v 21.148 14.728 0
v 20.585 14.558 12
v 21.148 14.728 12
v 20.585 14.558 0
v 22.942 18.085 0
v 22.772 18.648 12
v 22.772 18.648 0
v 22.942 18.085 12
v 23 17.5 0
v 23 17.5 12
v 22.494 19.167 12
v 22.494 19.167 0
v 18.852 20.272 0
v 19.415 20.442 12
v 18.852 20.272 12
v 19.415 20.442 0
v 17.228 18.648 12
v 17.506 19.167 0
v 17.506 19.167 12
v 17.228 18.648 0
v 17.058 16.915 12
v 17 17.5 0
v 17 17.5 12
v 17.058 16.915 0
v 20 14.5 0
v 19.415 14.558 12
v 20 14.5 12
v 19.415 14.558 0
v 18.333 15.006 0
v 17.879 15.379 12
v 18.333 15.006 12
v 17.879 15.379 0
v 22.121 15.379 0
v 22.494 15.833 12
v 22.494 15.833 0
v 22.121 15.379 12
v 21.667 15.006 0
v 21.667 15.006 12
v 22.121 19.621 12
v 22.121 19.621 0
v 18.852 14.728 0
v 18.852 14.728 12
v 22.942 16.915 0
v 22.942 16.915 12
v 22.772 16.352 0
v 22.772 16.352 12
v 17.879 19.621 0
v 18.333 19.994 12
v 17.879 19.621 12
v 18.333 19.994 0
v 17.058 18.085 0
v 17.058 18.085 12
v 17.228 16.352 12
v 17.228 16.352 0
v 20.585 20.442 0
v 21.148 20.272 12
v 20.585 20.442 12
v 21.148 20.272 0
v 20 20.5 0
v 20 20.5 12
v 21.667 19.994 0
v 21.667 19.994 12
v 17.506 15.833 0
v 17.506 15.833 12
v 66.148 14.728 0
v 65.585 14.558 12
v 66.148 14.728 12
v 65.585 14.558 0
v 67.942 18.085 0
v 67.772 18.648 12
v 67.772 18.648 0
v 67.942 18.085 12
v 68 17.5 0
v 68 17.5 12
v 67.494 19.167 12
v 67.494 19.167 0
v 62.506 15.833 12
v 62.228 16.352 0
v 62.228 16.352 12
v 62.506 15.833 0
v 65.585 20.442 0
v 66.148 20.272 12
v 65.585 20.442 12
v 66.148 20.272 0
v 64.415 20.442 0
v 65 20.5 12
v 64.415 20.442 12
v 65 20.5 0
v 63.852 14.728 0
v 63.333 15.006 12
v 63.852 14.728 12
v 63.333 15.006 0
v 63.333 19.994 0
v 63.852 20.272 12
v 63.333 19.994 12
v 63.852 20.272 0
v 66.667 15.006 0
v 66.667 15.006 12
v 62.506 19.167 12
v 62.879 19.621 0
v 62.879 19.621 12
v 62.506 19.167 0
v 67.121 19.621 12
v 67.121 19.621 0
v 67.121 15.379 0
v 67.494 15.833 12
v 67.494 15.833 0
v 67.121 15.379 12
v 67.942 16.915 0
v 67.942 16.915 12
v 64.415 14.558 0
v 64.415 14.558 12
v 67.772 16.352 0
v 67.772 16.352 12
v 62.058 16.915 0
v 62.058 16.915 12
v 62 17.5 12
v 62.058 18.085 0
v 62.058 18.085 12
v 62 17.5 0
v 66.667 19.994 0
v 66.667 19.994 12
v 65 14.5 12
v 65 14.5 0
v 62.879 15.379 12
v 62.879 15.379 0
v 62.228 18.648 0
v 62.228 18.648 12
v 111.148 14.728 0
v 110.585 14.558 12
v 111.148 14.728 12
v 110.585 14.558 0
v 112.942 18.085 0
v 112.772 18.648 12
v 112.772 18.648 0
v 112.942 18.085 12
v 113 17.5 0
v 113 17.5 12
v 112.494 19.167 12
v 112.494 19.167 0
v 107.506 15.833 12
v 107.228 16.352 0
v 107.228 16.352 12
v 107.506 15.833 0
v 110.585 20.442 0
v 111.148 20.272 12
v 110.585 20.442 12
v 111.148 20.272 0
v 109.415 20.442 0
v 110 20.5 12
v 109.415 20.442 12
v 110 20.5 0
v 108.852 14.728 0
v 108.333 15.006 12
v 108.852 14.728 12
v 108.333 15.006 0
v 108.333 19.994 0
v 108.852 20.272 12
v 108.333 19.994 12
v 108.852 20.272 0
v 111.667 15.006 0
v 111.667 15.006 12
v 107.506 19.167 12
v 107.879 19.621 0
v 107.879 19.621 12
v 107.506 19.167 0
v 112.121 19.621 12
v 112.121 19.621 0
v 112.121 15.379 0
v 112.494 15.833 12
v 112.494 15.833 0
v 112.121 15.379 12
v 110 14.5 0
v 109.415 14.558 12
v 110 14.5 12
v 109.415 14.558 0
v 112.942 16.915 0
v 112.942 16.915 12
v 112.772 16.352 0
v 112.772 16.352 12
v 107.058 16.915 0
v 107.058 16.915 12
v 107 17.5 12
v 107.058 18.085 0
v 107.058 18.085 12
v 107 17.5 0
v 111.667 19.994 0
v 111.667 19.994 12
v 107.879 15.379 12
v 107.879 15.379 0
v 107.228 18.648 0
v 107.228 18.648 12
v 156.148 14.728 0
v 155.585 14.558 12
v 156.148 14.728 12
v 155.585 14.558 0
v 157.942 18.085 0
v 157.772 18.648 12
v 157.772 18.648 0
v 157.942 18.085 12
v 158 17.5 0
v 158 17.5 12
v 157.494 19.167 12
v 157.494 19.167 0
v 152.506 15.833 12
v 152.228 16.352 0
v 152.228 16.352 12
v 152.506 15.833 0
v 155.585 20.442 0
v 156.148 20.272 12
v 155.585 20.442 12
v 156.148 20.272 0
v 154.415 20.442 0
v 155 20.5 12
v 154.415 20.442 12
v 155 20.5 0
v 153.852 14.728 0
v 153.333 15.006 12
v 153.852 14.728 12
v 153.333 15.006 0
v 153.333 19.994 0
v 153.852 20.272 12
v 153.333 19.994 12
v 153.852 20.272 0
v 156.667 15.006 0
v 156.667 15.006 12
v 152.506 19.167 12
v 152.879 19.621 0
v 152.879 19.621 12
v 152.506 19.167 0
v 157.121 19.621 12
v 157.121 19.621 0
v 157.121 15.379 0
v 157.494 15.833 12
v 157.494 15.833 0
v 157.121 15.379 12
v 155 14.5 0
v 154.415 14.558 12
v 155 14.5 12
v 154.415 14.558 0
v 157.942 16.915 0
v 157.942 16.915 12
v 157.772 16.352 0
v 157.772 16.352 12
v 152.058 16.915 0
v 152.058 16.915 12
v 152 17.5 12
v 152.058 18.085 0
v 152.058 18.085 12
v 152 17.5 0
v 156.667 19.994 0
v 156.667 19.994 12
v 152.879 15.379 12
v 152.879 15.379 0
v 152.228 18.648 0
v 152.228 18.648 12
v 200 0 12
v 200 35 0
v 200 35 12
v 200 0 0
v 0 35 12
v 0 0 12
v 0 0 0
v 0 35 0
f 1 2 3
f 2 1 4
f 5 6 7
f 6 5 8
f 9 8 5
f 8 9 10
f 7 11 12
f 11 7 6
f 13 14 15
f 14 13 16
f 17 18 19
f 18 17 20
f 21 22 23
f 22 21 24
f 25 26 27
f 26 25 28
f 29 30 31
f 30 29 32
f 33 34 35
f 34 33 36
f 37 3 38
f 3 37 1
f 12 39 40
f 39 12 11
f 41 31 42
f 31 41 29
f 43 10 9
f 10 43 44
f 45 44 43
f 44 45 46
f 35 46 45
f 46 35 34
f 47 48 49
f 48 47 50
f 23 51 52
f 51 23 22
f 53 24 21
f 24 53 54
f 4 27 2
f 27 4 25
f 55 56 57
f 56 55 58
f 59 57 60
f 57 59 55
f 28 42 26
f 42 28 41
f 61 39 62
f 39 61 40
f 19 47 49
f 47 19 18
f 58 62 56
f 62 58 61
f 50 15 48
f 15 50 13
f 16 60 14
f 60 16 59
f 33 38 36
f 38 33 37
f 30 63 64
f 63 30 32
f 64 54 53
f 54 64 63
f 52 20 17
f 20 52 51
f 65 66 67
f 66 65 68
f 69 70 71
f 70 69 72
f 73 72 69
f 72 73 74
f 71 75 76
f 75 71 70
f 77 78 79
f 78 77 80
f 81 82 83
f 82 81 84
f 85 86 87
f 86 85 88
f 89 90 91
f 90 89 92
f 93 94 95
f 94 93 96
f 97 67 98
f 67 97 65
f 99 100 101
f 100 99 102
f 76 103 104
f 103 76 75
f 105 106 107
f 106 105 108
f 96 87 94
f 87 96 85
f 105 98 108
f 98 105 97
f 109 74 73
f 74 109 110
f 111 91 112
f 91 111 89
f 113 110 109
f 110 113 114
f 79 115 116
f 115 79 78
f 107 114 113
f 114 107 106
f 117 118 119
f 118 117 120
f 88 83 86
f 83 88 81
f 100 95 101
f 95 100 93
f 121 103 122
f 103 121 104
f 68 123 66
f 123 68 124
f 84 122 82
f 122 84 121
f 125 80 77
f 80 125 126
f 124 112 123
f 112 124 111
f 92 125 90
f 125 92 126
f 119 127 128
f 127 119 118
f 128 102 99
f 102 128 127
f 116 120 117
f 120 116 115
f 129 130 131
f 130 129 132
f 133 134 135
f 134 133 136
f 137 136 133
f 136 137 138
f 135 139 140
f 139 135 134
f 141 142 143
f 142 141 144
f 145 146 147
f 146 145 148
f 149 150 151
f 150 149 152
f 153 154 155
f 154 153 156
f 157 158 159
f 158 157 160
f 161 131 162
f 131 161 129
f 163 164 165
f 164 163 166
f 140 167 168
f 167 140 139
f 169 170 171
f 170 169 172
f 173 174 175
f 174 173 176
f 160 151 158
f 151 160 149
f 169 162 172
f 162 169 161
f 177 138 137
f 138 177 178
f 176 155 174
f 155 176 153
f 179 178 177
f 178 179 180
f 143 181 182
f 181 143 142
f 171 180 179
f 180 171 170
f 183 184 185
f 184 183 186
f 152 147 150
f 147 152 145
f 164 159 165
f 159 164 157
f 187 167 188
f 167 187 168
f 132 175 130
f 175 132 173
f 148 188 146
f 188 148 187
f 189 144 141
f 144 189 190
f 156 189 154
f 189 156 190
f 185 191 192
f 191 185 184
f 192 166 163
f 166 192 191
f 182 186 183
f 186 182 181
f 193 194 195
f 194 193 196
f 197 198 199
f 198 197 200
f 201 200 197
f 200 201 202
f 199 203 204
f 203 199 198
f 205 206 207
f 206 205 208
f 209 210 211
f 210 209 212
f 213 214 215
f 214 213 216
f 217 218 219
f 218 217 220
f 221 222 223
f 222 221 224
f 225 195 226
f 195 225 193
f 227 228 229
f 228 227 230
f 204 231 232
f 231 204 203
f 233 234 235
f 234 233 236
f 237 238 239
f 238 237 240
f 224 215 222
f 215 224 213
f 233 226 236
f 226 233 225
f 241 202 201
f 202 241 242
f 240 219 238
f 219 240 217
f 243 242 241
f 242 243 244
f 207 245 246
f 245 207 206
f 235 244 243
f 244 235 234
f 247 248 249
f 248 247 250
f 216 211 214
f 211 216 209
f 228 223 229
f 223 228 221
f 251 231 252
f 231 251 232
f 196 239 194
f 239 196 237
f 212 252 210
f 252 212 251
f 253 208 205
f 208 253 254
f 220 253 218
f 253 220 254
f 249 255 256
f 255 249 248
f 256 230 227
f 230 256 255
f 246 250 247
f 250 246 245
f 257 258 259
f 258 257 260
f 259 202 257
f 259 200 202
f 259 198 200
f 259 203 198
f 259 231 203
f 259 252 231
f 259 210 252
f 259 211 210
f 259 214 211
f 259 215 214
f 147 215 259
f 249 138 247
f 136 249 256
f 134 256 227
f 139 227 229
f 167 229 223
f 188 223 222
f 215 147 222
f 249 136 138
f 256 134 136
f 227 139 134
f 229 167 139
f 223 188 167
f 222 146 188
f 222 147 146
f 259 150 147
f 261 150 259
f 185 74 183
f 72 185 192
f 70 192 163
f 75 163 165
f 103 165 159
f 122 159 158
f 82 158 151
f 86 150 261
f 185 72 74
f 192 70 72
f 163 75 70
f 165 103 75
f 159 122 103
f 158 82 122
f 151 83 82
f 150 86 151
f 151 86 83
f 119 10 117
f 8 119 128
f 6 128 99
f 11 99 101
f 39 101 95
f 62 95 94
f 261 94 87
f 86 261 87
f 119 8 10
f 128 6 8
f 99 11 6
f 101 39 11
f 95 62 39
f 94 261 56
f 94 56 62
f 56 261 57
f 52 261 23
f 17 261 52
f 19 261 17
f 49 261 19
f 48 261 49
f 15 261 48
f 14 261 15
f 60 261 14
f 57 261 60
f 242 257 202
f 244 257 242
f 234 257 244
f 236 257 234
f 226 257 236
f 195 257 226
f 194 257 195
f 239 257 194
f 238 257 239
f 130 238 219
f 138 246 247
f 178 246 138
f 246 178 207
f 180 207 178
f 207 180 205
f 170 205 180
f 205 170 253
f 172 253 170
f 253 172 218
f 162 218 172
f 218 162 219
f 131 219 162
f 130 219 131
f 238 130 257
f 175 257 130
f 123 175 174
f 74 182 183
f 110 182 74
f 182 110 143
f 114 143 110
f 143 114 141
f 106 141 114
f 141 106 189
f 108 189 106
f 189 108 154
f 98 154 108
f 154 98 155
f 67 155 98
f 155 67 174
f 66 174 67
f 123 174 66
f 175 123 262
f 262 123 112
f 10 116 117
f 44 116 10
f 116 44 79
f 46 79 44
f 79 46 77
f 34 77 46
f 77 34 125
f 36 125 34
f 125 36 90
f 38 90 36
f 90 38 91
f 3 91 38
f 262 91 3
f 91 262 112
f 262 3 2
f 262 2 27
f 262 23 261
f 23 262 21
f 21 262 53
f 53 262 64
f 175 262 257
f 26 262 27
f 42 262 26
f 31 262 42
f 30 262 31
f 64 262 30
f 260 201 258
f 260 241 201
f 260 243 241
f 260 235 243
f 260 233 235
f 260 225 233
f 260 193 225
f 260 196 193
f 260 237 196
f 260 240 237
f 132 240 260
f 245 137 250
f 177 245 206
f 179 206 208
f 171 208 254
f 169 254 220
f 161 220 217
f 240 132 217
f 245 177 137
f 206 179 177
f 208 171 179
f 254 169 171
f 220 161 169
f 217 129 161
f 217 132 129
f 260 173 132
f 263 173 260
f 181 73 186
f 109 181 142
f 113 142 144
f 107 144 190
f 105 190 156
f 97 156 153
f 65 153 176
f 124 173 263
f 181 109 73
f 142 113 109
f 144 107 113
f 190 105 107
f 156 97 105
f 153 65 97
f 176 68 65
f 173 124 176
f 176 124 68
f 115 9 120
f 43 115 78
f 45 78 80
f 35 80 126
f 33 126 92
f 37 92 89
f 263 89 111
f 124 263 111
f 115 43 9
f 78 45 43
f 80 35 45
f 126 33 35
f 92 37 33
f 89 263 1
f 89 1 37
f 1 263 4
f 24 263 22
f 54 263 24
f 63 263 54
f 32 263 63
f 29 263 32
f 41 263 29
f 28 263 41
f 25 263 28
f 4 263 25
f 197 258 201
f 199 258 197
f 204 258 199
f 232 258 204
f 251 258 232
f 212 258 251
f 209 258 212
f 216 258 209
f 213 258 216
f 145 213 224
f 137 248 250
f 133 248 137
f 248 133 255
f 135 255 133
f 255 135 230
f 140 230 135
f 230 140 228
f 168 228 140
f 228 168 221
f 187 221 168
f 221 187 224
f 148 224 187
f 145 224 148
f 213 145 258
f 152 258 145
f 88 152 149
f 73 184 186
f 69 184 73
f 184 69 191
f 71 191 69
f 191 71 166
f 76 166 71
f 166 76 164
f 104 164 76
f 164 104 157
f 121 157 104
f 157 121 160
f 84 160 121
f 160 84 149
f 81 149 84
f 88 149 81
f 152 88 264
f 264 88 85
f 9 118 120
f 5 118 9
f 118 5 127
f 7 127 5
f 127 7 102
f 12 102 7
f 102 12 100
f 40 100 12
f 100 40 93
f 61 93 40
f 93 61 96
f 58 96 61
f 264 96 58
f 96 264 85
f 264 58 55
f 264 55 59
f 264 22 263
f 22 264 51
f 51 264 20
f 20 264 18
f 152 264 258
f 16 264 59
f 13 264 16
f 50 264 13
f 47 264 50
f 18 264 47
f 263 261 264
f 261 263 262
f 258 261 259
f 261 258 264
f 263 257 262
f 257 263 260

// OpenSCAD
$fn = 32;

// ----------------------------------------------------------------------
// Long rail: 200-250 mm mounting rail
// ----------------------------------------------------------------------

// --- parameters (mm) ---
rail_l = 200;             // rail length, X
rail_w = 35;              // rail width, Y
rail_t = 12;              // rail thickness, Z
hole_d = 6;               // mounting hole diameter
hole_start = 20;          // first hole offset from the end
hole_pitch = 45;          // hole pitch
holes = 4;                // number of holes
fit_tol = 0.05;           // tolerance for press fits, mm
free_tol = 0.2;           // tolerance for clearance fits, mm

difference() {
  cube([rail_l, rail_w, rail_t]);
  for (i = [0 : holes - 1])
    translate([hole_start + i * hole_pitch, rail_w / 2, -1])
      cylinder(h = rail_t + 2, d = hole_d);
}
